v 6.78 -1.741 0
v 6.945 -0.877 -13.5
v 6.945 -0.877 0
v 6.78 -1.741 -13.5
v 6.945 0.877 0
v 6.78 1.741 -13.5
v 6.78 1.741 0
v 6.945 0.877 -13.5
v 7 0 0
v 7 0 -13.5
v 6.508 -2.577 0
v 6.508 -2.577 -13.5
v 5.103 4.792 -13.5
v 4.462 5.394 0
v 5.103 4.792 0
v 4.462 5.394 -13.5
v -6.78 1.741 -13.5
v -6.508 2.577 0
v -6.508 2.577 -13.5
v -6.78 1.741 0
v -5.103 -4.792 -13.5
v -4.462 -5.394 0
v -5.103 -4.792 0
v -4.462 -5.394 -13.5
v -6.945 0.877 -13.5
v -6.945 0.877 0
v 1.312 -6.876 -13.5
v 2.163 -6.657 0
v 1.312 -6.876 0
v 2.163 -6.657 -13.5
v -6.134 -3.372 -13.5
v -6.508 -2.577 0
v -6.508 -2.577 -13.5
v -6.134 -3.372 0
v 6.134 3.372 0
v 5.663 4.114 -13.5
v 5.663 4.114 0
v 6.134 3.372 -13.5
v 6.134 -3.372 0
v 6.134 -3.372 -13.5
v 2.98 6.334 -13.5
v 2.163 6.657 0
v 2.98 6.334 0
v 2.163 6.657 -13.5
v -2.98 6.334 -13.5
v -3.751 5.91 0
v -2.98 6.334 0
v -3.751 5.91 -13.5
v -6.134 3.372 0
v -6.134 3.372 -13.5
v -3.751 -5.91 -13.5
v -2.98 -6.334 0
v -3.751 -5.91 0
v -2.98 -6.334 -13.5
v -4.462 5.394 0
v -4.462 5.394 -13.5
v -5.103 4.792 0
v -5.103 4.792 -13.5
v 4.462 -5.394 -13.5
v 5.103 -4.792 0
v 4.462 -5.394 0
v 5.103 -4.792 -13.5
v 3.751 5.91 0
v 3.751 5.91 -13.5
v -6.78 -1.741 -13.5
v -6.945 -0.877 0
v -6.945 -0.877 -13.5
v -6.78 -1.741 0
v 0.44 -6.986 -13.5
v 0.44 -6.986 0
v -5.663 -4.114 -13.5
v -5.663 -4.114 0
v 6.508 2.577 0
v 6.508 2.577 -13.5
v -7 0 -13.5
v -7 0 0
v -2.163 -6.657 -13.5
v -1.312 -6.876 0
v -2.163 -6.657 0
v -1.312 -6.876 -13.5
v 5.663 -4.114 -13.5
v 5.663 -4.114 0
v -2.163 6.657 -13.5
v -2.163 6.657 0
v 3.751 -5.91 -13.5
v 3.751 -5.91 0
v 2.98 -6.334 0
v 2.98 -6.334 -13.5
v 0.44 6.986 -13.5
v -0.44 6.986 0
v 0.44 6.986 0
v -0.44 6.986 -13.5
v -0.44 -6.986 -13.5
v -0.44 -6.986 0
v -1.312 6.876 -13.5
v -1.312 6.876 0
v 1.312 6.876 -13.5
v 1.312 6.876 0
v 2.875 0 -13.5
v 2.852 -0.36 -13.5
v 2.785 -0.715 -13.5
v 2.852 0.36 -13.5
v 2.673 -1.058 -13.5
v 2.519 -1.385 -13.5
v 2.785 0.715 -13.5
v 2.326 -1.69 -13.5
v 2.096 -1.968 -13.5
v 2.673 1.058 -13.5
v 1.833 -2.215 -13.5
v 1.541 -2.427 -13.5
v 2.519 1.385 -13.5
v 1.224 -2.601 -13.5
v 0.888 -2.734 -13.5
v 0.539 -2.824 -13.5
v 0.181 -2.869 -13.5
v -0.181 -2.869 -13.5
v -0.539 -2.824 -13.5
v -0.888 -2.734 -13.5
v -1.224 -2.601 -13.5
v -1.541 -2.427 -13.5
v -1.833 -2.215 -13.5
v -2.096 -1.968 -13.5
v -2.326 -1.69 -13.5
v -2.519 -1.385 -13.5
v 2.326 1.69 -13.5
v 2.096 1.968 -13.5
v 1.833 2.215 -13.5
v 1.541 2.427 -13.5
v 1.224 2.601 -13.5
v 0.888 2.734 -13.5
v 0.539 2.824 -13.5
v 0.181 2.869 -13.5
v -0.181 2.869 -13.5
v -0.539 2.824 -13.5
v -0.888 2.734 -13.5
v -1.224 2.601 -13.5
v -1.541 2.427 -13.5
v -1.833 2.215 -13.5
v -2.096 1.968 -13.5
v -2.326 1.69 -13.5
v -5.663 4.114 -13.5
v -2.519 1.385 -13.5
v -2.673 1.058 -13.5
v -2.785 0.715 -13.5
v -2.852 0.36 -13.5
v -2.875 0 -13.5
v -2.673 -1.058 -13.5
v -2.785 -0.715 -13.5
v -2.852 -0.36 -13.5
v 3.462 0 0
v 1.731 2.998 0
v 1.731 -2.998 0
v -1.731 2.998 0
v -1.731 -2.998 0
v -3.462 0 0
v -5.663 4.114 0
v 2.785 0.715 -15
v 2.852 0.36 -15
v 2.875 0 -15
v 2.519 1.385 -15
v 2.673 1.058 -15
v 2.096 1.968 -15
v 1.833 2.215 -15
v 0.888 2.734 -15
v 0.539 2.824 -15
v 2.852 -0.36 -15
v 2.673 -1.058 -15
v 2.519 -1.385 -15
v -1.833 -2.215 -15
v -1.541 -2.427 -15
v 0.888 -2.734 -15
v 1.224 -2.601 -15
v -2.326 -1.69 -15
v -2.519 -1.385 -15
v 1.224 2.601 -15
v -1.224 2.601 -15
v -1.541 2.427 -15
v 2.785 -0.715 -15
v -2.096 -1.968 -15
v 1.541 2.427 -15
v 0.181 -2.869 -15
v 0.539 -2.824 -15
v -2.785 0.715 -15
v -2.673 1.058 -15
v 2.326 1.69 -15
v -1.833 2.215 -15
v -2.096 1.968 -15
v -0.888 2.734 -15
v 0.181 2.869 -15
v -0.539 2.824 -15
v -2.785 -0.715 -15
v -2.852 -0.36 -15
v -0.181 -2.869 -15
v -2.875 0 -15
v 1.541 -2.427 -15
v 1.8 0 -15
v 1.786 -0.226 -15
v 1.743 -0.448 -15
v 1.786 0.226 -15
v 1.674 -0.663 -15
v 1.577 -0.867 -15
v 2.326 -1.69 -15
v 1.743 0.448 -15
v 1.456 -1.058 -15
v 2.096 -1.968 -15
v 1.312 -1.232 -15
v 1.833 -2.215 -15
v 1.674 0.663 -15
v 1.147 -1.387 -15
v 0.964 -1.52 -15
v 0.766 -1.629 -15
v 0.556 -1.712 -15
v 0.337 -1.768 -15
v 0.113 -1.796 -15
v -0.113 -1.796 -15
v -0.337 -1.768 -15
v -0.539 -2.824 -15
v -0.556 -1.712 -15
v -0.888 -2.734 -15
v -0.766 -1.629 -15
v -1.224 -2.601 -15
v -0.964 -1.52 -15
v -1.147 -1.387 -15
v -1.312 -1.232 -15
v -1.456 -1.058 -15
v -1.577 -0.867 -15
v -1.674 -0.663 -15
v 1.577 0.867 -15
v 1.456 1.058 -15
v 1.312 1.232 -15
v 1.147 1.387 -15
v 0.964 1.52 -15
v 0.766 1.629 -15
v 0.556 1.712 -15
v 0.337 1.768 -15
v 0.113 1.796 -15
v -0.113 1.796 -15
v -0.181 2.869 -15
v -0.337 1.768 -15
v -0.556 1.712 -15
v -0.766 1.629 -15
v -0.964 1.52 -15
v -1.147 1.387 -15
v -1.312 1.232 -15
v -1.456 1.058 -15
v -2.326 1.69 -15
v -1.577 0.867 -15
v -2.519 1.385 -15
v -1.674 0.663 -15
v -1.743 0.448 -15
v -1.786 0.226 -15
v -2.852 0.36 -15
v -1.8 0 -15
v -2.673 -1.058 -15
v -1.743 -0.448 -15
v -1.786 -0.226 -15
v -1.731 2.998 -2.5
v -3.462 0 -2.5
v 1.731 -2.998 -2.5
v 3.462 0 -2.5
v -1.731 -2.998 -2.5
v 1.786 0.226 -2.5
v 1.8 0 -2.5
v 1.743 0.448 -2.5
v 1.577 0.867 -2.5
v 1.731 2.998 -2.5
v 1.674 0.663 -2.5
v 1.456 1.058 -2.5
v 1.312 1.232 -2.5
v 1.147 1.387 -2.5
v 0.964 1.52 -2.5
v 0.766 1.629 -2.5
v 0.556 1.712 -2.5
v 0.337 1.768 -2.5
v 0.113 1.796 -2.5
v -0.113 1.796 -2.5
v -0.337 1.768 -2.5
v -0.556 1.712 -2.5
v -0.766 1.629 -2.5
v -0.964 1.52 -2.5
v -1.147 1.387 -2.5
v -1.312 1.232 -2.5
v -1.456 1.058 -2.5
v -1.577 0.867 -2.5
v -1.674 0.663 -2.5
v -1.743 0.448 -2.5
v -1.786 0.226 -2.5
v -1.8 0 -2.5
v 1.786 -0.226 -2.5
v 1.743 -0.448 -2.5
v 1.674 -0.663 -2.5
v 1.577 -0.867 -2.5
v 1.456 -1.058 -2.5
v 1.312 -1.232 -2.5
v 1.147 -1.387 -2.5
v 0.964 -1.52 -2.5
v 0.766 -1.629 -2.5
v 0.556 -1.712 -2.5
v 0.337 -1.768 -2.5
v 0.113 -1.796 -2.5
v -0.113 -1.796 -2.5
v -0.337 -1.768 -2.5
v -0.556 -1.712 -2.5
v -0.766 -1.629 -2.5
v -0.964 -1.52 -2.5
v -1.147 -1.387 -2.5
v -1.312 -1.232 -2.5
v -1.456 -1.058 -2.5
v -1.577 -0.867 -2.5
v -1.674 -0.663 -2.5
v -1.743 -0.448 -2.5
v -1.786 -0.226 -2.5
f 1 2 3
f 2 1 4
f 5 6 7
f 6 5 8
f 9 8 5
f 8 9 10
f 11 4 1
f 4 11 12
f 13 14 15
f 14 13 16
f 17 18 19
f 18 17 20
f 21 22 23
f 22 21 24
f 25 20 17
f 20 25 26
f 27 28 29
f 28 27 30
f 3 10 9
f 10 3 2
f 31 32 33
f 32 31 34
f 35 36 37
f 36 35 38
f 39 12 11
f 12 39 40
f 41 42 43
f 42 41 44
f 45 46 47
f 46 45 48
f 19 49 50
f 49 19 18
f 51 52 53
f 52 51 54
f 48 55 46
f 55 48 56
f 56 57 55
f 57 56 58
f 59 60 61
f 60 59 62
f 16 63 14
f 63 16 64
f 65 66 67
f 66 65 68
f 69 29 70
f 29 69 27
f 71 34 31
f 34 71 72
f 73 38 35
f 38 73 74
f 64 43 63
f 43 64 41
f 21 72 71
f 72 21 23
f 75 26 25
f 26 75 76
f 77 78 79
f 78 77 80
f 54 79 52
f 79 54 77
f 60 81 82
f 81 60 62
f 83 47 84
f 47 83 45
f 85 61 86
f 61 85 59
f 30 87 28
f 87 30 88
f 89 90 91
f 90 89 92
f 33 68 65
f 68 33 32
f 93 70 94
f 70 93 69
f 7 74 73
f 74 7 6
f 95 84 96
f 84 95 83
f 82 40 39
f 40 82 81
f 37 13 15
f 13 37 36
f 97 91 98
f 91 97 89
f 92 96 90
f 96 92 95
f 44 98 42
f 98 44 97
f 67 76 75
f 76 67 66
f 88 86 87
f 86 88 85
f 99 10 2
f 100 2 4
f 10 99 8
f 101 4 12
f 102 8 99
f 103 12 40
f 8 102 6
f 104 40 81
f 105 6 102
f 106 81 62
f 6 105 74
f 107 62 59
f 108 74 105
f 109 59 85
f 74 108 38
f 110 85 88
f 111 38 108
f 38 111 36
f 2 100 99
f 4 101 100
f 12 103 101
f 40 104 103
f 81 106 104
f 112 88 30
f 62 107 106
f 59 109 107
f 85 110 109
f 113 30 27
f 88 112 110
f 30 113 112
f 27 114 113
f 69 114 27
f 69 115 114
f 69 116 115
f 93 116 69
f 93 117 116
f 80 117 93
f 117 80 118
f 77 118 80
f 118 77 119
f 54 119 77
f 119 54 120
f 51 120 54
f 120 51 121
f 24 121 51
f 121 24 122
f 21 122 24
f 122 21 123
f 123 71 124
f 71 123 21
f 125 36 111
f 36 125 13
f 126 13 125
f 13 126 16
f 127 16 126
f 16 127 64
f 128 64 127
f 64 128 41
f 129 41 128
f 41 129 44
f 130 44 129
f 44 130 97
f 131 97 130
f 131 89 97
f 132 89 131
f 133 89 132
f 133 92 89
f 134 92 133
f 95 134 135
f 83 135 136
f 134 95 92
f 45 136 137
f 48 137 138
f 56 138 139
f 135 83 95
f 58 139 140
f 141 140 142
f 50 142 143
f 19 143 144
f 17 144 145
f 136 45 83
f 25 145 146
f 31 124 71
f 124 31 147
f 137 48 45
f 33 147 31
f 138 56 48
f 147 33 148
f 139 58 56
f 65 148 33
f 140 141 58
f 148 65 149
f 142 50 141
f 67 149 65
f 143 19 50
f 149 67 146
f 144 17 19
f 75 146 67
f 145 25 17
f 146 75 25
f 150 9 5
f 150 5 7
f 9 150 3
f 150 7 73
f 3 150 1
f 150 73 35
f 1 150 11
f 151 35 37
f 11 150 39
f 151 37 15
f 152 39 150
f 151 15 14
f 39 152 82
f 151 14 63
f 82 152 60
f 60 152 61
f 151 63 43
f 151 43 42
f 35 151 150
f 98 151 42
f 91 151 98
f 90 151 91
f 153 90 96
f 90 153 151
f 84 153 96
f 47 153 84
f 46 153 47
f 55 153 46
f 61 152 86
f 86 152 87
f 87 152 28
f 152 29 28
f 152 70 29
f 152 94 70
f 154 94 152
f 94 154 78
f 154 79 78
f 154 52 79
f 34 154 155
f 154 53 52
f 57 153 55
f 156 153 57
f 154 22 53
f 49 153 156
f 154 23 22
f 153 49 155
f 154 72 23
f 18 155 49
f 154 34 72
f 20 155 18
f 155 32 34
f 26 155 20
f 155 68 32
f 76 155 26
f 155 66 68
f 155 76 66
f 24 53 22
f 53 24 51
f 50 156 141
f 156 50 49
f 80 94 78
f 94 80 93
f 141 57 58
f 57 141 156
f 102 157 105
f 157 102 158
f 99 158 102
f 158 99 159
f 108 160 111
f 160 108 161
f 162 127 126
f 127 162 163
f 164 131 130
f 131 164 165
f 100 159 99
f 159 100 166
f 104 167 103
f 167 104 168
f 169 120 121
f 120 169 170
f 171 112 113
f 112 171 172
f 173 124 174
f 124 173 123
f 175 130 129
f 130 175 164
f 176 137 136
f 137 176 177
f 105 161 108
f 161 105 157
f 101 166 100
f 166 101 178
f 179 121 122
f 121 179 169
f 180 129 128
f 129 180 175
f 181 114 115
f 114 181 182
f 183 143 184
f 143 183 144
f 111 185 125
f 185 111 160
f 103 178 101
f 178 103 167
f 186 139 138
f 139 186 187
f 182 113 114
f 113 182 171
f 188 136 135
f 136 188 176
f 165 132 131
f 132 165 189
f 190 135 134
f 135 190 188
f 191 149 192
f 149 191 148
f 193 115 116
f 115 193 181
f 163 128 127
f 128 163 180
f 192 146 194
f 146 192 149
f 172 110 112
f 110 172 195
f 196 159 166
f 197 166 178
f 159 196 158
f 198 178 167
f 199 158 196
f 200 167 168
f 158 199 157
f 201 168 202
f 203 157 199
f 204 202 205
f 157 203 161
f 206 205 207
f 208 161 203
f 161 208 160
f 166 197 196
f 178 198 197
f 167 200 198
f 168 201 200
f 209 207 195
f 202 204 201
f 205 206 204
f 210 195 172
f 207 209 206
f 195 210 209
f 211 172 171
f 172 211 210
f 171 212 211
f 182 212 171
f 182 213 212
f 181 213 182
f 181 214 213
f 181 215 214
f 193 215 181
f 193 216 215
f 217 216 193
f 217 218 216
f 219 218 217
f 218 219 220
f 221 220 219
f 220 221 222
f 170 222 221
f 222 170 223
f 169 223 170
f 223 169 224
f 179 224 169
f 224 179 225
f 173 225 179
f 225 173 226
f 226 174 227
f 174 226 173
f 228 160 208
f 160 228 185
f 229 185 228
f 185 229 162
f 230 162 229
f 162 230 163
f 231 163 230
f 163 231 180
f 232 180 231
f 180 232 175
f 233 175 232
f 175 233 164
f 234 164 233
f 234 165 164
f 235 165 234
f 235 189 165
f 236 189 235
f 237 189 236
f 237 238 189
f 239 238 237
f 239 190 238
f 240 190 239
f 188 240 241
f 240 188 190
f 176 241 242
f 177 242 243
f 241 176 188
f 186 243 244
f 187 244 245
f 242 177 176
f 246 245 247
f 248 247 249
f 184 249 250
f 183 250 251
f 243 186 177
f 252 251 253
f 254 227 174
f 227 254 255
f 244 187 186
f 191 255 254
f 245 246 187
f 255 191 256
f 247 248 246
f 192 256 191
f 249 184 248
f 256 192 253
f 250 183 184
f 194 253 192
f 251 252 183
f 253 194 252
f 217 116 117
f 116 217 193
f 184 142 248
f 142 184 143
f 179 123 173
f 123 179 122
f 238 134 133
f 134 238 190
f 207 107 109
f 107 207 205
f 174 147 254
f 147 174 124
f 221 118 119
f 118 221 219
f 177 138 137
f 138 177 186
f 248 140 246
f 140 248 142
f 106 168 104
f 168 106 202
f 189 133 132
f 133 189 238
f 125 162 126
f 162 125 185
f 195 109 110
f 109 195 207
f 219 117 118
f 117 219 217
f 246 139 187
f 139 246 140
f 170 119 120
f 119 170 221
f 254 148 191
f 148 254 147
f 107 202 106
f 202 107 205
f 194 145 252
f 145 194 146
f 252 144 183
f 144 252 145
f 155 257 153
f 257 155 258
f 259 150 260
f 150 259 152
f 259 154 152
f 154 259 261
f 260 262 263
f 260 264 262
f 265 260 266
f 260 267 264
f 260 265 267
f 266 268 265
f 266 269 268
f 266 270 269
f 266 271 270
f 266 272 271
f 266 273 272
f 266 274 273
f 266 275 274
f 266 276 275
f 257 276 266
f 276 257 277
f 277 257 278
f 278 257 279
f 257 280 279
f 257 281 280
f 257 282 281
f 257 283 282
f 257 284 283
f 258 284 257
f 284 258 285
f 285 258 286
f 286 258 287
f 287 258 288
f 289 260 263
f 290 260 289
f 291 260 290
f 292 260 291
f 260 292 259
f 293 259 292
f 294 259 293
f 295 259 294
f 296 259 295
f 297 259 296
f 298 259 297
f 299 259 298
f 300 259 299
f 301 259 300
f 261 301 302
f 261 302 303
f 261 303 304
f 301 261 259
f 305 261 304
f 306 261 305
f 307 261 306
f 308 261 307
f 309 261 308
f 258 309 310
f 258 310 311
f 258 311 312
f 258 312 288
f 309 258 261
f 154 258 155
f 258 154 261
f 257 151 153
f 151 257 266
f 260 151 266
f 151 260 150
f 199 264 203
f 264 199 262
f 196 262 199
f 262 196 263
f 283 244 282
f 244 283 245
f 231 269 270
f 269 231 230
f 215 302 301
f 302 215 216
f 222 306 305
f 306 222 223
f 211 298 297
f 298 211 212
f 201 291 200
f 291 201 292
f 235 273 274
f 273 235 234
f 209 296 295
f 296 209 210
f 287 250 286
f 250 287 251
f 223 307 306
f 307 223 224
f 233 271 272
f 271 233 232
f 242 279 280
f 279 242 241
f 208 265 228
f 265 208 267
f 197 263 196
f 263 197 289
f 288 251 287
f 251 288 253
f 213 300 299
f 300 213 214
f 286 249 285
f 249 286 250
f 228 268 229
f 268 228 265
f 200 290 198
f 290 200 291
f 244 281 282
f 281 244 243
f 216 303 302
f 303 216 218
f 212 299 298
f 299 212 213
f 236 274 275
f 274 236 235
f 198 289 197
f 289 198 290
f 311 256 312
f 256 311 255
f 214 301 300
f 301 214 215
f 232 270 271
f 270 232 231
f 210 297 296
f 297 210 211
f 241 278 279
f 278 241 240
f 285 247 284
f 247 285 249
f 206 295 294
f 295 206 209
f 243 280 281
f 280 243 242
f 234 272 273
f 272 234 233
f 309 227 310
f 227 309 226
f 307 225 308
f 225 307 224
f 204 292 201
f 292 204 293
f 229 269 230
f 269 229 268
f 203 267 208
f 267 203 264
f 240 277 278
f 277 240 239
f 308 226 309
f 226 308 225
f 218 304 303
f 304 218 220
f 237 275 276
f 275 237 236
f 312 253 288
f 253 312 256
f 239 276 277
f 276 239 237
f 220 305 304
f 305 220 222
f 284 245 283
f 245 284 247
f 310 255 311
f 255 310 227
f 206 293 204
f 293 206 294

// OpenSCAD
$fn = 50;


difference() {
	union() {
		translate(v = [0, 0, -13.5000000000]) {
			cylinder(h = 13.5000000000, r = 7.0000000000);
		}
		#translate(v = [0, 0, -15.0000000000]) {
			cylinder(h = 15, r = 2.8750000000);
		}
	}
	union() {
		translate(v = [0, 0, 0]) {
			rotate(a = [0, 0, 0]) {
				difference() {
					union() {
						translate(v = [0, 0, -2.5000000000]) {
							linear_extrude(height = 2.5000000000) {
								polygon(points = [[3.4620000000, 0.0000000000], [1.7310000000, 2.9981799479], [-1.7310000000, 2.9981799479], [-3.4620000000, 0.0000000000], [-1.7310000000, -2.9981799479], [1.7310000000, -2.9981799479]]);
							}
						}
					}
					union();
				}
			}
		}
		#translate(v = [0, 0, -100.0000000000]) {
			cylinder(h = 200, r = 1.8000000000);
		}
	}
}
